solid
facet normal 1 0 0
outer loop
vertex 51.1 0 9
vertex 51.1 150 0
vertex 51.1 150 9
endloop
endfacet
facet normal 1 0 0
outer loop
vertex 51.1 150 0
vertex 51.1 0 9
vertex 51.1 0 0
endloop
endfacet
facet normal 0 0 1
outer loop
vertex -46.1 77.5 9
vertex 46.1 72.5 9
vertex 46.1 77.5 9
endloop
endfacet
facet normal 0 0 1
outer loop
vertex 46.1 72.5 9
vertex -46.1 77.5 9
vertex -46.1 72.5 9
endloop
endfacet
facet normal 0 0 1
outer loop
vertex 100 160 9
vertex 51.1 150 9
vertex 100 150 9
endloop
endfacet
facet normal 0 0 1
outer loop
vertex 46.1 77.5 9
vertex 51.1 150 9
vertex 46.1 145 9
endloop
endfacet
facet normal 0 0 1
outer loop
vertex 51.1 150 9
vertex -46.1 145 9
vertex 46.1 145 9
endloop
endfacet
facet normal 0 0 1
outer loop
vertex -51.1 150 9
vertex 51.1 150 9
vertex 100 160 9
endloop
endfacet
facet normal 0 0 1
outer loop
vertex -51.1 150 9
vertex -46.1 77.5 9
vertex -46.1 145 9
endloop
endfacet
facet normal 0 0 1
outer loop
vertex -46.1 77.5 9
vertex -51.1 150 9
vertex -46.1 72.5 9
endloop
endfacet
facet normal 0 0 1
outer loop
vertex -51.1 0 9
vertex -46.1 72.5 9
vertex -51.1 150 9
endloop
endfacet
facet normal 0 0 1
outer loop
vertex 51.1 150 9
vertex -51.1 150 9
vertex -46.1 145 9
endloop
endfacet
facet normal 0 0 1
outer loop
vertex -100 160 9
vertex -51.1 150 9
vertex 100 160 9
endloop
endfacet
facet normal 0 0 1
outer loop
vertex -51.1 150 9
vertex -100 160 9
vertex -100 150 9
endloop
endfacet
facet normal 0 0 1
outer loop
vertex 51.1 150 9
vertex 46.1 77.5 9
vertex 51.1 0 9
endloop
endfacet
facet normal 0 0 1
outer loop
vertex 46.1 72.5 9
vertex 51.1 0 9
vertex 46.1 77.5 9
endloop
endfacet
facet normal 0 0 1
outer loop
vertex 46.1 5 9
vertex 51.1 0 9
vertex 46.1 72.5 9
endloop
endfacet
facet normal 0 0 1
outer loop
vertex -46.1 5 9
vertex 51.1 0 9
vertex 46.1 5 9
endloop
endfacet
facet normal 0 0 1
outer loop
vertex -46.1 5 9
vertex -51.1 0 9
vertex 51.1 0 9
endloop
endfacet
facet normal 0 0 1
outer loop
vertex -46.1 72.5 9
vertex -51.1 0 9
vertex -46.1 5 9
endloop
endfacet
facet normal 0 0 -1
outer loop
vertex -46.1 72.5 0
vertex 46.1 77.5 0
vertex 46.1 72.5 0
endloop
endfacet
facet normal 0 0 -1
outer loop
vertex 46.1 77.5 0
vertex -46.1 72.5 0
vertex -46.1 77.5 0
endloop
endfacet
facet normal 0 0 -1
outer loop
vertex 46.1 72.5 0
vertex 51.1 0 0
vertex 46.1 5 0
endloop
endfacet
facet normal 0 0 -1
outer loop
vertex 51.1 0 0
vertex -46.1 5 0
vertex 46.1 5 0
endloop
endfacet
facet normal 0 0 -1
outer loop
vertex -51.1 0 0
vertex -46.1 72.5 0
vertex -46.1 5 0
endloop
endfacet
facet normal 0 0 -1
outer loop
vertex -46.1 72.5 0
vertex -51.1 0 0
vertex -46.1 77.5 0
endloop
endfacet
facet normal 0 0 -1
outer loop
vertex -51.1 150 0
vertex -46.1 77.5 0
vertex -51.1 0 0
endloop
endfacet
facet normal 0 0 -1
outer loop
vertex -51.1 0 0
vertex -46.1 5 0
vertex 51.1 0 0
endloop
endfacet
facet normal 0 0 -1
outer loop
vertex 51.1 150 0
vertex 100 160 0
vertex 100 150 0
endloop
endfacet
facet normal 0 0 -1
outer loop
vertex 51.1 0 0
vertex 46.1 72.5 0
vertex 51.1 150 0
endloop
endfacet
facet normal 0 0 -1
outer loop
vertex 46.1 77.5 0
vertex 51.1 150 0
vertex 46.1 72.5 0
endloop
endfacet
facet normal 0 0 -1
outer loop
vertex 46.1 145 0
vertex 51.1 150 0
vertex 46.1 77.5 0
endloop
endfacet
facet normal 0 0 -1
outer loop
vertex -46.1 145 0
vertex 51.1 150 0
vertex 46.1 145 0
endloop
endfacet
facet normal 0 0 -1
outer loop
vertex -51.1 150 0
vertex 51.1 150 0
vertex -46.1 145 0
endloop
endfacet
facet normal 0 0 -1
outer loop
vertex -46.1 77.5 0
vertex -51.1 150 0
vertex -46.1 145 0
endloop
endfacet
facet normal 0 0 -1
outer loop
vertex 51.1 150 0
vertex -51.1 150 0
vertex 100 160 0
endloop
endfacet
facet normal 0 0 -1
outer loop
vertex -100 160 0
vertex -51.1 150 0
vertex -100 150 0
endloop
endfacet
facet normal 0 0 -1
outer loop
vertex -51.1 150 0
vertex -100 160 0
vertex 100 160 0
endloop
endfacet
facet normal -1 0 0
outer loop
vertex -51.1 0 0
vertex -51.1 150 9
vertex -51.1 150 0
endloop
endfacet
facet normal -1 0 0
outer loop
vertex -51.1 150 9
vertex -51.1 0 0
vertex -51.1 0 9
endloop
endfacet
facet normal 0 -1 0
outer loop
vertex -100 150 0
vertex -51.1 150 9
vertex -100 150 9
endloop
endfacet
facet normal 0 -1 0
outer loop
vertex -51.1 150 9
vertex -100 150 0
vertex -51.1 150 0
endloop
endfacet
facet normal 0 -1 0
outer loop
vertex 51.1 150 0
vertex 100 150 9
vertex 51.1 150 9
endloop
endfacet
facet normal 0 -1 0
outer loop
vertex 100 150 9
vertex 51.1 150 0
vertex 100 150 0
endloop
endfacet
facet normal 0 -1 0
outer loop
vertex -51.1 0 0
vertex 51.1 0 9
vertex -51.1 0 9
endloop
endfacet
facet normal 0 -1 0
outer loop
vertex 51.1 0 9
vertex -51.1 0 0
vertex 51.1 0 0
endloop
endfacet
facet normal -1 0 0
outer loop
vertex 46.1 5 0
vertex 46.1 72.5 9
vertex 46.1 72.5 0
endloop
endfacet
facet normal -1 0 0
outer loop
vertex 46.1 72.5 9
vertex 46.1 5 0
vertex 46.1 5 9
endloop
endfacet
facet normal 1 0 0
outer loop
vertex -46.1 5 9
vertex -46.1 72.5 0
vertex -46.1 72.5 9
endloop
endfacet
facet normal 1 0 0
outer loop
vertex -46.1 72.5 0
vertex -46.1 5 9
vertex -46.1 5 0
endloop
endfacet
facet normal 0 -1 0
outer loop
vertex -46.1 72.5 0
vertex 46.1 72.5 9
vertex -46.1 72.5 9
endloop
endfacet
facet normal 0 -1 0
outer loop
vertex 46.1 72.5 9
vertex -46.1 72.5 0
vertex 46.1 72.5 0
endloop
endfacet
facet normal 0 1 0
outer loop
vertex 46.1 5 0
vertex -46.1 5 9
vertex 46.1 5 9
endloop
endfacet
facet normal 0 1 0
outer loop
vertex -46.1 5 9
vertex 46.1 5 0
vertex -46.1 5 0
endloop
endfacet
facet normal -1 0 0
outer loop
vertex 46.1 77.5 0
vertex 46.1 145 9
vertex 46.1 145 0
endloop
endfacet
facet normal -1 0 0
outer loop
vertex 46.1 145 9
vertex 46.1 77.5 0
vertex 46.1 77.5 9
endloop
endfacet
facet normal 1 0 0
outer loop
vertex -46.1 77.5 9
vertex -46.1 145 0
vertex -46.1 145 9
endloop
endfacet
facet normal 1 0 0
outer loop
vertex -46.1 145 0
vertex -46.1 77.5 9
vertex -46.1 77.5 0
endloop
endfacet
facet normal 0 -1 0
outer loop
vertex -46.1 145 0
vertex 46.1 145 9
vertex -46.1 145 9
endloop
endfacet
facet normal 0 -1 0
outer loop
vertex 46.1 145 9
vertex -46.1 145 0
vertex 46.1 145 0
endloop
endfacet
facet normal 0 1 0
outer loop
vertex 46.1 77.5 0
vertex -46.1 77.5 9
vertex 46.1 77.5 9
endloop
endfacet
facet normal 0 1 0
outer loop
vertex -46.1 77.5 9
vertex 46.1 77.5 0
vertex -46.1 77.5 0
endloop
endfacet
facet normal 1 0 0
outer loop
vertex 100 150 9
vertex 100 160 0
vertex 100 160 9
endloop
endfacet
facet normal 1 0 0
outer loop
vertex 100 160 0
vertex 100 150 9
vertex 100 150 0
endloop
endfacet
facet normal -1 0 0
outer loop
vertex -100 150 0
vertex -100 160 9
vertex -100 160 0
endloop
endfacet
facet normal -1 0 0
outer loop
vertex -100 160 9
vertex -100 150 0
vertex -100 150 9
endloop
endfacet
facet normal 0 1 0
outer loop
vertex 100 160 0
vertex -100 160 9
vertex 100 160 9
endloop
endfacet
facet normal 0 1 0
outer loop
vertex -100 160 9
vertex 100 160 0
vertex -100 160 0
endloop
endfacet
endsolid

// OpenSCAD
// Cale de calibration des pieds - Vibe A1
// Largeur = entraxe des pieds a zero (186,8 mm, modele SundayA1_short_new) - largeur reelle d'une semelle.
semelle   = 84.6;    // largeur reelle d'une semelle (mm), mesuree le 2026-10-12
entraxe   = 186.8;   // entraxe des pieds a zero, d'apres le modele complet SundayA1_short_new
W         = entraxe - semelle;   // largeur de la cale (102,2 mm)
L         = 150;     // longueur de la partie entre les pieds
H         = 9;       // hauteur (touche le bord des semelles)
paroi     = 5;       // epaisseur des parois du cadre
barre_lg  = 200;     // longueur de la barre de butee des pointes (reduire si le plateau est petit)
barre_ep  = 10;      // epaisseur de la barre

difference() {
    translate([-W/2, 0, 0]) cube([W, L, H]);
    translate([-W/2 + paroi, paroi, -1])           cube([W - 2*paroi, L/2 - 1.5*paroi, H + 2]);
    translate([-W/2 + paroi, L/2 + paroi/2, -1])   cube([W - 2*paroi, L/2 - 1.5*paroi, H + 2]);
}
translate([-barre_lg/2, L, 0]) cube([barre_lg, barre_ep, H]);
